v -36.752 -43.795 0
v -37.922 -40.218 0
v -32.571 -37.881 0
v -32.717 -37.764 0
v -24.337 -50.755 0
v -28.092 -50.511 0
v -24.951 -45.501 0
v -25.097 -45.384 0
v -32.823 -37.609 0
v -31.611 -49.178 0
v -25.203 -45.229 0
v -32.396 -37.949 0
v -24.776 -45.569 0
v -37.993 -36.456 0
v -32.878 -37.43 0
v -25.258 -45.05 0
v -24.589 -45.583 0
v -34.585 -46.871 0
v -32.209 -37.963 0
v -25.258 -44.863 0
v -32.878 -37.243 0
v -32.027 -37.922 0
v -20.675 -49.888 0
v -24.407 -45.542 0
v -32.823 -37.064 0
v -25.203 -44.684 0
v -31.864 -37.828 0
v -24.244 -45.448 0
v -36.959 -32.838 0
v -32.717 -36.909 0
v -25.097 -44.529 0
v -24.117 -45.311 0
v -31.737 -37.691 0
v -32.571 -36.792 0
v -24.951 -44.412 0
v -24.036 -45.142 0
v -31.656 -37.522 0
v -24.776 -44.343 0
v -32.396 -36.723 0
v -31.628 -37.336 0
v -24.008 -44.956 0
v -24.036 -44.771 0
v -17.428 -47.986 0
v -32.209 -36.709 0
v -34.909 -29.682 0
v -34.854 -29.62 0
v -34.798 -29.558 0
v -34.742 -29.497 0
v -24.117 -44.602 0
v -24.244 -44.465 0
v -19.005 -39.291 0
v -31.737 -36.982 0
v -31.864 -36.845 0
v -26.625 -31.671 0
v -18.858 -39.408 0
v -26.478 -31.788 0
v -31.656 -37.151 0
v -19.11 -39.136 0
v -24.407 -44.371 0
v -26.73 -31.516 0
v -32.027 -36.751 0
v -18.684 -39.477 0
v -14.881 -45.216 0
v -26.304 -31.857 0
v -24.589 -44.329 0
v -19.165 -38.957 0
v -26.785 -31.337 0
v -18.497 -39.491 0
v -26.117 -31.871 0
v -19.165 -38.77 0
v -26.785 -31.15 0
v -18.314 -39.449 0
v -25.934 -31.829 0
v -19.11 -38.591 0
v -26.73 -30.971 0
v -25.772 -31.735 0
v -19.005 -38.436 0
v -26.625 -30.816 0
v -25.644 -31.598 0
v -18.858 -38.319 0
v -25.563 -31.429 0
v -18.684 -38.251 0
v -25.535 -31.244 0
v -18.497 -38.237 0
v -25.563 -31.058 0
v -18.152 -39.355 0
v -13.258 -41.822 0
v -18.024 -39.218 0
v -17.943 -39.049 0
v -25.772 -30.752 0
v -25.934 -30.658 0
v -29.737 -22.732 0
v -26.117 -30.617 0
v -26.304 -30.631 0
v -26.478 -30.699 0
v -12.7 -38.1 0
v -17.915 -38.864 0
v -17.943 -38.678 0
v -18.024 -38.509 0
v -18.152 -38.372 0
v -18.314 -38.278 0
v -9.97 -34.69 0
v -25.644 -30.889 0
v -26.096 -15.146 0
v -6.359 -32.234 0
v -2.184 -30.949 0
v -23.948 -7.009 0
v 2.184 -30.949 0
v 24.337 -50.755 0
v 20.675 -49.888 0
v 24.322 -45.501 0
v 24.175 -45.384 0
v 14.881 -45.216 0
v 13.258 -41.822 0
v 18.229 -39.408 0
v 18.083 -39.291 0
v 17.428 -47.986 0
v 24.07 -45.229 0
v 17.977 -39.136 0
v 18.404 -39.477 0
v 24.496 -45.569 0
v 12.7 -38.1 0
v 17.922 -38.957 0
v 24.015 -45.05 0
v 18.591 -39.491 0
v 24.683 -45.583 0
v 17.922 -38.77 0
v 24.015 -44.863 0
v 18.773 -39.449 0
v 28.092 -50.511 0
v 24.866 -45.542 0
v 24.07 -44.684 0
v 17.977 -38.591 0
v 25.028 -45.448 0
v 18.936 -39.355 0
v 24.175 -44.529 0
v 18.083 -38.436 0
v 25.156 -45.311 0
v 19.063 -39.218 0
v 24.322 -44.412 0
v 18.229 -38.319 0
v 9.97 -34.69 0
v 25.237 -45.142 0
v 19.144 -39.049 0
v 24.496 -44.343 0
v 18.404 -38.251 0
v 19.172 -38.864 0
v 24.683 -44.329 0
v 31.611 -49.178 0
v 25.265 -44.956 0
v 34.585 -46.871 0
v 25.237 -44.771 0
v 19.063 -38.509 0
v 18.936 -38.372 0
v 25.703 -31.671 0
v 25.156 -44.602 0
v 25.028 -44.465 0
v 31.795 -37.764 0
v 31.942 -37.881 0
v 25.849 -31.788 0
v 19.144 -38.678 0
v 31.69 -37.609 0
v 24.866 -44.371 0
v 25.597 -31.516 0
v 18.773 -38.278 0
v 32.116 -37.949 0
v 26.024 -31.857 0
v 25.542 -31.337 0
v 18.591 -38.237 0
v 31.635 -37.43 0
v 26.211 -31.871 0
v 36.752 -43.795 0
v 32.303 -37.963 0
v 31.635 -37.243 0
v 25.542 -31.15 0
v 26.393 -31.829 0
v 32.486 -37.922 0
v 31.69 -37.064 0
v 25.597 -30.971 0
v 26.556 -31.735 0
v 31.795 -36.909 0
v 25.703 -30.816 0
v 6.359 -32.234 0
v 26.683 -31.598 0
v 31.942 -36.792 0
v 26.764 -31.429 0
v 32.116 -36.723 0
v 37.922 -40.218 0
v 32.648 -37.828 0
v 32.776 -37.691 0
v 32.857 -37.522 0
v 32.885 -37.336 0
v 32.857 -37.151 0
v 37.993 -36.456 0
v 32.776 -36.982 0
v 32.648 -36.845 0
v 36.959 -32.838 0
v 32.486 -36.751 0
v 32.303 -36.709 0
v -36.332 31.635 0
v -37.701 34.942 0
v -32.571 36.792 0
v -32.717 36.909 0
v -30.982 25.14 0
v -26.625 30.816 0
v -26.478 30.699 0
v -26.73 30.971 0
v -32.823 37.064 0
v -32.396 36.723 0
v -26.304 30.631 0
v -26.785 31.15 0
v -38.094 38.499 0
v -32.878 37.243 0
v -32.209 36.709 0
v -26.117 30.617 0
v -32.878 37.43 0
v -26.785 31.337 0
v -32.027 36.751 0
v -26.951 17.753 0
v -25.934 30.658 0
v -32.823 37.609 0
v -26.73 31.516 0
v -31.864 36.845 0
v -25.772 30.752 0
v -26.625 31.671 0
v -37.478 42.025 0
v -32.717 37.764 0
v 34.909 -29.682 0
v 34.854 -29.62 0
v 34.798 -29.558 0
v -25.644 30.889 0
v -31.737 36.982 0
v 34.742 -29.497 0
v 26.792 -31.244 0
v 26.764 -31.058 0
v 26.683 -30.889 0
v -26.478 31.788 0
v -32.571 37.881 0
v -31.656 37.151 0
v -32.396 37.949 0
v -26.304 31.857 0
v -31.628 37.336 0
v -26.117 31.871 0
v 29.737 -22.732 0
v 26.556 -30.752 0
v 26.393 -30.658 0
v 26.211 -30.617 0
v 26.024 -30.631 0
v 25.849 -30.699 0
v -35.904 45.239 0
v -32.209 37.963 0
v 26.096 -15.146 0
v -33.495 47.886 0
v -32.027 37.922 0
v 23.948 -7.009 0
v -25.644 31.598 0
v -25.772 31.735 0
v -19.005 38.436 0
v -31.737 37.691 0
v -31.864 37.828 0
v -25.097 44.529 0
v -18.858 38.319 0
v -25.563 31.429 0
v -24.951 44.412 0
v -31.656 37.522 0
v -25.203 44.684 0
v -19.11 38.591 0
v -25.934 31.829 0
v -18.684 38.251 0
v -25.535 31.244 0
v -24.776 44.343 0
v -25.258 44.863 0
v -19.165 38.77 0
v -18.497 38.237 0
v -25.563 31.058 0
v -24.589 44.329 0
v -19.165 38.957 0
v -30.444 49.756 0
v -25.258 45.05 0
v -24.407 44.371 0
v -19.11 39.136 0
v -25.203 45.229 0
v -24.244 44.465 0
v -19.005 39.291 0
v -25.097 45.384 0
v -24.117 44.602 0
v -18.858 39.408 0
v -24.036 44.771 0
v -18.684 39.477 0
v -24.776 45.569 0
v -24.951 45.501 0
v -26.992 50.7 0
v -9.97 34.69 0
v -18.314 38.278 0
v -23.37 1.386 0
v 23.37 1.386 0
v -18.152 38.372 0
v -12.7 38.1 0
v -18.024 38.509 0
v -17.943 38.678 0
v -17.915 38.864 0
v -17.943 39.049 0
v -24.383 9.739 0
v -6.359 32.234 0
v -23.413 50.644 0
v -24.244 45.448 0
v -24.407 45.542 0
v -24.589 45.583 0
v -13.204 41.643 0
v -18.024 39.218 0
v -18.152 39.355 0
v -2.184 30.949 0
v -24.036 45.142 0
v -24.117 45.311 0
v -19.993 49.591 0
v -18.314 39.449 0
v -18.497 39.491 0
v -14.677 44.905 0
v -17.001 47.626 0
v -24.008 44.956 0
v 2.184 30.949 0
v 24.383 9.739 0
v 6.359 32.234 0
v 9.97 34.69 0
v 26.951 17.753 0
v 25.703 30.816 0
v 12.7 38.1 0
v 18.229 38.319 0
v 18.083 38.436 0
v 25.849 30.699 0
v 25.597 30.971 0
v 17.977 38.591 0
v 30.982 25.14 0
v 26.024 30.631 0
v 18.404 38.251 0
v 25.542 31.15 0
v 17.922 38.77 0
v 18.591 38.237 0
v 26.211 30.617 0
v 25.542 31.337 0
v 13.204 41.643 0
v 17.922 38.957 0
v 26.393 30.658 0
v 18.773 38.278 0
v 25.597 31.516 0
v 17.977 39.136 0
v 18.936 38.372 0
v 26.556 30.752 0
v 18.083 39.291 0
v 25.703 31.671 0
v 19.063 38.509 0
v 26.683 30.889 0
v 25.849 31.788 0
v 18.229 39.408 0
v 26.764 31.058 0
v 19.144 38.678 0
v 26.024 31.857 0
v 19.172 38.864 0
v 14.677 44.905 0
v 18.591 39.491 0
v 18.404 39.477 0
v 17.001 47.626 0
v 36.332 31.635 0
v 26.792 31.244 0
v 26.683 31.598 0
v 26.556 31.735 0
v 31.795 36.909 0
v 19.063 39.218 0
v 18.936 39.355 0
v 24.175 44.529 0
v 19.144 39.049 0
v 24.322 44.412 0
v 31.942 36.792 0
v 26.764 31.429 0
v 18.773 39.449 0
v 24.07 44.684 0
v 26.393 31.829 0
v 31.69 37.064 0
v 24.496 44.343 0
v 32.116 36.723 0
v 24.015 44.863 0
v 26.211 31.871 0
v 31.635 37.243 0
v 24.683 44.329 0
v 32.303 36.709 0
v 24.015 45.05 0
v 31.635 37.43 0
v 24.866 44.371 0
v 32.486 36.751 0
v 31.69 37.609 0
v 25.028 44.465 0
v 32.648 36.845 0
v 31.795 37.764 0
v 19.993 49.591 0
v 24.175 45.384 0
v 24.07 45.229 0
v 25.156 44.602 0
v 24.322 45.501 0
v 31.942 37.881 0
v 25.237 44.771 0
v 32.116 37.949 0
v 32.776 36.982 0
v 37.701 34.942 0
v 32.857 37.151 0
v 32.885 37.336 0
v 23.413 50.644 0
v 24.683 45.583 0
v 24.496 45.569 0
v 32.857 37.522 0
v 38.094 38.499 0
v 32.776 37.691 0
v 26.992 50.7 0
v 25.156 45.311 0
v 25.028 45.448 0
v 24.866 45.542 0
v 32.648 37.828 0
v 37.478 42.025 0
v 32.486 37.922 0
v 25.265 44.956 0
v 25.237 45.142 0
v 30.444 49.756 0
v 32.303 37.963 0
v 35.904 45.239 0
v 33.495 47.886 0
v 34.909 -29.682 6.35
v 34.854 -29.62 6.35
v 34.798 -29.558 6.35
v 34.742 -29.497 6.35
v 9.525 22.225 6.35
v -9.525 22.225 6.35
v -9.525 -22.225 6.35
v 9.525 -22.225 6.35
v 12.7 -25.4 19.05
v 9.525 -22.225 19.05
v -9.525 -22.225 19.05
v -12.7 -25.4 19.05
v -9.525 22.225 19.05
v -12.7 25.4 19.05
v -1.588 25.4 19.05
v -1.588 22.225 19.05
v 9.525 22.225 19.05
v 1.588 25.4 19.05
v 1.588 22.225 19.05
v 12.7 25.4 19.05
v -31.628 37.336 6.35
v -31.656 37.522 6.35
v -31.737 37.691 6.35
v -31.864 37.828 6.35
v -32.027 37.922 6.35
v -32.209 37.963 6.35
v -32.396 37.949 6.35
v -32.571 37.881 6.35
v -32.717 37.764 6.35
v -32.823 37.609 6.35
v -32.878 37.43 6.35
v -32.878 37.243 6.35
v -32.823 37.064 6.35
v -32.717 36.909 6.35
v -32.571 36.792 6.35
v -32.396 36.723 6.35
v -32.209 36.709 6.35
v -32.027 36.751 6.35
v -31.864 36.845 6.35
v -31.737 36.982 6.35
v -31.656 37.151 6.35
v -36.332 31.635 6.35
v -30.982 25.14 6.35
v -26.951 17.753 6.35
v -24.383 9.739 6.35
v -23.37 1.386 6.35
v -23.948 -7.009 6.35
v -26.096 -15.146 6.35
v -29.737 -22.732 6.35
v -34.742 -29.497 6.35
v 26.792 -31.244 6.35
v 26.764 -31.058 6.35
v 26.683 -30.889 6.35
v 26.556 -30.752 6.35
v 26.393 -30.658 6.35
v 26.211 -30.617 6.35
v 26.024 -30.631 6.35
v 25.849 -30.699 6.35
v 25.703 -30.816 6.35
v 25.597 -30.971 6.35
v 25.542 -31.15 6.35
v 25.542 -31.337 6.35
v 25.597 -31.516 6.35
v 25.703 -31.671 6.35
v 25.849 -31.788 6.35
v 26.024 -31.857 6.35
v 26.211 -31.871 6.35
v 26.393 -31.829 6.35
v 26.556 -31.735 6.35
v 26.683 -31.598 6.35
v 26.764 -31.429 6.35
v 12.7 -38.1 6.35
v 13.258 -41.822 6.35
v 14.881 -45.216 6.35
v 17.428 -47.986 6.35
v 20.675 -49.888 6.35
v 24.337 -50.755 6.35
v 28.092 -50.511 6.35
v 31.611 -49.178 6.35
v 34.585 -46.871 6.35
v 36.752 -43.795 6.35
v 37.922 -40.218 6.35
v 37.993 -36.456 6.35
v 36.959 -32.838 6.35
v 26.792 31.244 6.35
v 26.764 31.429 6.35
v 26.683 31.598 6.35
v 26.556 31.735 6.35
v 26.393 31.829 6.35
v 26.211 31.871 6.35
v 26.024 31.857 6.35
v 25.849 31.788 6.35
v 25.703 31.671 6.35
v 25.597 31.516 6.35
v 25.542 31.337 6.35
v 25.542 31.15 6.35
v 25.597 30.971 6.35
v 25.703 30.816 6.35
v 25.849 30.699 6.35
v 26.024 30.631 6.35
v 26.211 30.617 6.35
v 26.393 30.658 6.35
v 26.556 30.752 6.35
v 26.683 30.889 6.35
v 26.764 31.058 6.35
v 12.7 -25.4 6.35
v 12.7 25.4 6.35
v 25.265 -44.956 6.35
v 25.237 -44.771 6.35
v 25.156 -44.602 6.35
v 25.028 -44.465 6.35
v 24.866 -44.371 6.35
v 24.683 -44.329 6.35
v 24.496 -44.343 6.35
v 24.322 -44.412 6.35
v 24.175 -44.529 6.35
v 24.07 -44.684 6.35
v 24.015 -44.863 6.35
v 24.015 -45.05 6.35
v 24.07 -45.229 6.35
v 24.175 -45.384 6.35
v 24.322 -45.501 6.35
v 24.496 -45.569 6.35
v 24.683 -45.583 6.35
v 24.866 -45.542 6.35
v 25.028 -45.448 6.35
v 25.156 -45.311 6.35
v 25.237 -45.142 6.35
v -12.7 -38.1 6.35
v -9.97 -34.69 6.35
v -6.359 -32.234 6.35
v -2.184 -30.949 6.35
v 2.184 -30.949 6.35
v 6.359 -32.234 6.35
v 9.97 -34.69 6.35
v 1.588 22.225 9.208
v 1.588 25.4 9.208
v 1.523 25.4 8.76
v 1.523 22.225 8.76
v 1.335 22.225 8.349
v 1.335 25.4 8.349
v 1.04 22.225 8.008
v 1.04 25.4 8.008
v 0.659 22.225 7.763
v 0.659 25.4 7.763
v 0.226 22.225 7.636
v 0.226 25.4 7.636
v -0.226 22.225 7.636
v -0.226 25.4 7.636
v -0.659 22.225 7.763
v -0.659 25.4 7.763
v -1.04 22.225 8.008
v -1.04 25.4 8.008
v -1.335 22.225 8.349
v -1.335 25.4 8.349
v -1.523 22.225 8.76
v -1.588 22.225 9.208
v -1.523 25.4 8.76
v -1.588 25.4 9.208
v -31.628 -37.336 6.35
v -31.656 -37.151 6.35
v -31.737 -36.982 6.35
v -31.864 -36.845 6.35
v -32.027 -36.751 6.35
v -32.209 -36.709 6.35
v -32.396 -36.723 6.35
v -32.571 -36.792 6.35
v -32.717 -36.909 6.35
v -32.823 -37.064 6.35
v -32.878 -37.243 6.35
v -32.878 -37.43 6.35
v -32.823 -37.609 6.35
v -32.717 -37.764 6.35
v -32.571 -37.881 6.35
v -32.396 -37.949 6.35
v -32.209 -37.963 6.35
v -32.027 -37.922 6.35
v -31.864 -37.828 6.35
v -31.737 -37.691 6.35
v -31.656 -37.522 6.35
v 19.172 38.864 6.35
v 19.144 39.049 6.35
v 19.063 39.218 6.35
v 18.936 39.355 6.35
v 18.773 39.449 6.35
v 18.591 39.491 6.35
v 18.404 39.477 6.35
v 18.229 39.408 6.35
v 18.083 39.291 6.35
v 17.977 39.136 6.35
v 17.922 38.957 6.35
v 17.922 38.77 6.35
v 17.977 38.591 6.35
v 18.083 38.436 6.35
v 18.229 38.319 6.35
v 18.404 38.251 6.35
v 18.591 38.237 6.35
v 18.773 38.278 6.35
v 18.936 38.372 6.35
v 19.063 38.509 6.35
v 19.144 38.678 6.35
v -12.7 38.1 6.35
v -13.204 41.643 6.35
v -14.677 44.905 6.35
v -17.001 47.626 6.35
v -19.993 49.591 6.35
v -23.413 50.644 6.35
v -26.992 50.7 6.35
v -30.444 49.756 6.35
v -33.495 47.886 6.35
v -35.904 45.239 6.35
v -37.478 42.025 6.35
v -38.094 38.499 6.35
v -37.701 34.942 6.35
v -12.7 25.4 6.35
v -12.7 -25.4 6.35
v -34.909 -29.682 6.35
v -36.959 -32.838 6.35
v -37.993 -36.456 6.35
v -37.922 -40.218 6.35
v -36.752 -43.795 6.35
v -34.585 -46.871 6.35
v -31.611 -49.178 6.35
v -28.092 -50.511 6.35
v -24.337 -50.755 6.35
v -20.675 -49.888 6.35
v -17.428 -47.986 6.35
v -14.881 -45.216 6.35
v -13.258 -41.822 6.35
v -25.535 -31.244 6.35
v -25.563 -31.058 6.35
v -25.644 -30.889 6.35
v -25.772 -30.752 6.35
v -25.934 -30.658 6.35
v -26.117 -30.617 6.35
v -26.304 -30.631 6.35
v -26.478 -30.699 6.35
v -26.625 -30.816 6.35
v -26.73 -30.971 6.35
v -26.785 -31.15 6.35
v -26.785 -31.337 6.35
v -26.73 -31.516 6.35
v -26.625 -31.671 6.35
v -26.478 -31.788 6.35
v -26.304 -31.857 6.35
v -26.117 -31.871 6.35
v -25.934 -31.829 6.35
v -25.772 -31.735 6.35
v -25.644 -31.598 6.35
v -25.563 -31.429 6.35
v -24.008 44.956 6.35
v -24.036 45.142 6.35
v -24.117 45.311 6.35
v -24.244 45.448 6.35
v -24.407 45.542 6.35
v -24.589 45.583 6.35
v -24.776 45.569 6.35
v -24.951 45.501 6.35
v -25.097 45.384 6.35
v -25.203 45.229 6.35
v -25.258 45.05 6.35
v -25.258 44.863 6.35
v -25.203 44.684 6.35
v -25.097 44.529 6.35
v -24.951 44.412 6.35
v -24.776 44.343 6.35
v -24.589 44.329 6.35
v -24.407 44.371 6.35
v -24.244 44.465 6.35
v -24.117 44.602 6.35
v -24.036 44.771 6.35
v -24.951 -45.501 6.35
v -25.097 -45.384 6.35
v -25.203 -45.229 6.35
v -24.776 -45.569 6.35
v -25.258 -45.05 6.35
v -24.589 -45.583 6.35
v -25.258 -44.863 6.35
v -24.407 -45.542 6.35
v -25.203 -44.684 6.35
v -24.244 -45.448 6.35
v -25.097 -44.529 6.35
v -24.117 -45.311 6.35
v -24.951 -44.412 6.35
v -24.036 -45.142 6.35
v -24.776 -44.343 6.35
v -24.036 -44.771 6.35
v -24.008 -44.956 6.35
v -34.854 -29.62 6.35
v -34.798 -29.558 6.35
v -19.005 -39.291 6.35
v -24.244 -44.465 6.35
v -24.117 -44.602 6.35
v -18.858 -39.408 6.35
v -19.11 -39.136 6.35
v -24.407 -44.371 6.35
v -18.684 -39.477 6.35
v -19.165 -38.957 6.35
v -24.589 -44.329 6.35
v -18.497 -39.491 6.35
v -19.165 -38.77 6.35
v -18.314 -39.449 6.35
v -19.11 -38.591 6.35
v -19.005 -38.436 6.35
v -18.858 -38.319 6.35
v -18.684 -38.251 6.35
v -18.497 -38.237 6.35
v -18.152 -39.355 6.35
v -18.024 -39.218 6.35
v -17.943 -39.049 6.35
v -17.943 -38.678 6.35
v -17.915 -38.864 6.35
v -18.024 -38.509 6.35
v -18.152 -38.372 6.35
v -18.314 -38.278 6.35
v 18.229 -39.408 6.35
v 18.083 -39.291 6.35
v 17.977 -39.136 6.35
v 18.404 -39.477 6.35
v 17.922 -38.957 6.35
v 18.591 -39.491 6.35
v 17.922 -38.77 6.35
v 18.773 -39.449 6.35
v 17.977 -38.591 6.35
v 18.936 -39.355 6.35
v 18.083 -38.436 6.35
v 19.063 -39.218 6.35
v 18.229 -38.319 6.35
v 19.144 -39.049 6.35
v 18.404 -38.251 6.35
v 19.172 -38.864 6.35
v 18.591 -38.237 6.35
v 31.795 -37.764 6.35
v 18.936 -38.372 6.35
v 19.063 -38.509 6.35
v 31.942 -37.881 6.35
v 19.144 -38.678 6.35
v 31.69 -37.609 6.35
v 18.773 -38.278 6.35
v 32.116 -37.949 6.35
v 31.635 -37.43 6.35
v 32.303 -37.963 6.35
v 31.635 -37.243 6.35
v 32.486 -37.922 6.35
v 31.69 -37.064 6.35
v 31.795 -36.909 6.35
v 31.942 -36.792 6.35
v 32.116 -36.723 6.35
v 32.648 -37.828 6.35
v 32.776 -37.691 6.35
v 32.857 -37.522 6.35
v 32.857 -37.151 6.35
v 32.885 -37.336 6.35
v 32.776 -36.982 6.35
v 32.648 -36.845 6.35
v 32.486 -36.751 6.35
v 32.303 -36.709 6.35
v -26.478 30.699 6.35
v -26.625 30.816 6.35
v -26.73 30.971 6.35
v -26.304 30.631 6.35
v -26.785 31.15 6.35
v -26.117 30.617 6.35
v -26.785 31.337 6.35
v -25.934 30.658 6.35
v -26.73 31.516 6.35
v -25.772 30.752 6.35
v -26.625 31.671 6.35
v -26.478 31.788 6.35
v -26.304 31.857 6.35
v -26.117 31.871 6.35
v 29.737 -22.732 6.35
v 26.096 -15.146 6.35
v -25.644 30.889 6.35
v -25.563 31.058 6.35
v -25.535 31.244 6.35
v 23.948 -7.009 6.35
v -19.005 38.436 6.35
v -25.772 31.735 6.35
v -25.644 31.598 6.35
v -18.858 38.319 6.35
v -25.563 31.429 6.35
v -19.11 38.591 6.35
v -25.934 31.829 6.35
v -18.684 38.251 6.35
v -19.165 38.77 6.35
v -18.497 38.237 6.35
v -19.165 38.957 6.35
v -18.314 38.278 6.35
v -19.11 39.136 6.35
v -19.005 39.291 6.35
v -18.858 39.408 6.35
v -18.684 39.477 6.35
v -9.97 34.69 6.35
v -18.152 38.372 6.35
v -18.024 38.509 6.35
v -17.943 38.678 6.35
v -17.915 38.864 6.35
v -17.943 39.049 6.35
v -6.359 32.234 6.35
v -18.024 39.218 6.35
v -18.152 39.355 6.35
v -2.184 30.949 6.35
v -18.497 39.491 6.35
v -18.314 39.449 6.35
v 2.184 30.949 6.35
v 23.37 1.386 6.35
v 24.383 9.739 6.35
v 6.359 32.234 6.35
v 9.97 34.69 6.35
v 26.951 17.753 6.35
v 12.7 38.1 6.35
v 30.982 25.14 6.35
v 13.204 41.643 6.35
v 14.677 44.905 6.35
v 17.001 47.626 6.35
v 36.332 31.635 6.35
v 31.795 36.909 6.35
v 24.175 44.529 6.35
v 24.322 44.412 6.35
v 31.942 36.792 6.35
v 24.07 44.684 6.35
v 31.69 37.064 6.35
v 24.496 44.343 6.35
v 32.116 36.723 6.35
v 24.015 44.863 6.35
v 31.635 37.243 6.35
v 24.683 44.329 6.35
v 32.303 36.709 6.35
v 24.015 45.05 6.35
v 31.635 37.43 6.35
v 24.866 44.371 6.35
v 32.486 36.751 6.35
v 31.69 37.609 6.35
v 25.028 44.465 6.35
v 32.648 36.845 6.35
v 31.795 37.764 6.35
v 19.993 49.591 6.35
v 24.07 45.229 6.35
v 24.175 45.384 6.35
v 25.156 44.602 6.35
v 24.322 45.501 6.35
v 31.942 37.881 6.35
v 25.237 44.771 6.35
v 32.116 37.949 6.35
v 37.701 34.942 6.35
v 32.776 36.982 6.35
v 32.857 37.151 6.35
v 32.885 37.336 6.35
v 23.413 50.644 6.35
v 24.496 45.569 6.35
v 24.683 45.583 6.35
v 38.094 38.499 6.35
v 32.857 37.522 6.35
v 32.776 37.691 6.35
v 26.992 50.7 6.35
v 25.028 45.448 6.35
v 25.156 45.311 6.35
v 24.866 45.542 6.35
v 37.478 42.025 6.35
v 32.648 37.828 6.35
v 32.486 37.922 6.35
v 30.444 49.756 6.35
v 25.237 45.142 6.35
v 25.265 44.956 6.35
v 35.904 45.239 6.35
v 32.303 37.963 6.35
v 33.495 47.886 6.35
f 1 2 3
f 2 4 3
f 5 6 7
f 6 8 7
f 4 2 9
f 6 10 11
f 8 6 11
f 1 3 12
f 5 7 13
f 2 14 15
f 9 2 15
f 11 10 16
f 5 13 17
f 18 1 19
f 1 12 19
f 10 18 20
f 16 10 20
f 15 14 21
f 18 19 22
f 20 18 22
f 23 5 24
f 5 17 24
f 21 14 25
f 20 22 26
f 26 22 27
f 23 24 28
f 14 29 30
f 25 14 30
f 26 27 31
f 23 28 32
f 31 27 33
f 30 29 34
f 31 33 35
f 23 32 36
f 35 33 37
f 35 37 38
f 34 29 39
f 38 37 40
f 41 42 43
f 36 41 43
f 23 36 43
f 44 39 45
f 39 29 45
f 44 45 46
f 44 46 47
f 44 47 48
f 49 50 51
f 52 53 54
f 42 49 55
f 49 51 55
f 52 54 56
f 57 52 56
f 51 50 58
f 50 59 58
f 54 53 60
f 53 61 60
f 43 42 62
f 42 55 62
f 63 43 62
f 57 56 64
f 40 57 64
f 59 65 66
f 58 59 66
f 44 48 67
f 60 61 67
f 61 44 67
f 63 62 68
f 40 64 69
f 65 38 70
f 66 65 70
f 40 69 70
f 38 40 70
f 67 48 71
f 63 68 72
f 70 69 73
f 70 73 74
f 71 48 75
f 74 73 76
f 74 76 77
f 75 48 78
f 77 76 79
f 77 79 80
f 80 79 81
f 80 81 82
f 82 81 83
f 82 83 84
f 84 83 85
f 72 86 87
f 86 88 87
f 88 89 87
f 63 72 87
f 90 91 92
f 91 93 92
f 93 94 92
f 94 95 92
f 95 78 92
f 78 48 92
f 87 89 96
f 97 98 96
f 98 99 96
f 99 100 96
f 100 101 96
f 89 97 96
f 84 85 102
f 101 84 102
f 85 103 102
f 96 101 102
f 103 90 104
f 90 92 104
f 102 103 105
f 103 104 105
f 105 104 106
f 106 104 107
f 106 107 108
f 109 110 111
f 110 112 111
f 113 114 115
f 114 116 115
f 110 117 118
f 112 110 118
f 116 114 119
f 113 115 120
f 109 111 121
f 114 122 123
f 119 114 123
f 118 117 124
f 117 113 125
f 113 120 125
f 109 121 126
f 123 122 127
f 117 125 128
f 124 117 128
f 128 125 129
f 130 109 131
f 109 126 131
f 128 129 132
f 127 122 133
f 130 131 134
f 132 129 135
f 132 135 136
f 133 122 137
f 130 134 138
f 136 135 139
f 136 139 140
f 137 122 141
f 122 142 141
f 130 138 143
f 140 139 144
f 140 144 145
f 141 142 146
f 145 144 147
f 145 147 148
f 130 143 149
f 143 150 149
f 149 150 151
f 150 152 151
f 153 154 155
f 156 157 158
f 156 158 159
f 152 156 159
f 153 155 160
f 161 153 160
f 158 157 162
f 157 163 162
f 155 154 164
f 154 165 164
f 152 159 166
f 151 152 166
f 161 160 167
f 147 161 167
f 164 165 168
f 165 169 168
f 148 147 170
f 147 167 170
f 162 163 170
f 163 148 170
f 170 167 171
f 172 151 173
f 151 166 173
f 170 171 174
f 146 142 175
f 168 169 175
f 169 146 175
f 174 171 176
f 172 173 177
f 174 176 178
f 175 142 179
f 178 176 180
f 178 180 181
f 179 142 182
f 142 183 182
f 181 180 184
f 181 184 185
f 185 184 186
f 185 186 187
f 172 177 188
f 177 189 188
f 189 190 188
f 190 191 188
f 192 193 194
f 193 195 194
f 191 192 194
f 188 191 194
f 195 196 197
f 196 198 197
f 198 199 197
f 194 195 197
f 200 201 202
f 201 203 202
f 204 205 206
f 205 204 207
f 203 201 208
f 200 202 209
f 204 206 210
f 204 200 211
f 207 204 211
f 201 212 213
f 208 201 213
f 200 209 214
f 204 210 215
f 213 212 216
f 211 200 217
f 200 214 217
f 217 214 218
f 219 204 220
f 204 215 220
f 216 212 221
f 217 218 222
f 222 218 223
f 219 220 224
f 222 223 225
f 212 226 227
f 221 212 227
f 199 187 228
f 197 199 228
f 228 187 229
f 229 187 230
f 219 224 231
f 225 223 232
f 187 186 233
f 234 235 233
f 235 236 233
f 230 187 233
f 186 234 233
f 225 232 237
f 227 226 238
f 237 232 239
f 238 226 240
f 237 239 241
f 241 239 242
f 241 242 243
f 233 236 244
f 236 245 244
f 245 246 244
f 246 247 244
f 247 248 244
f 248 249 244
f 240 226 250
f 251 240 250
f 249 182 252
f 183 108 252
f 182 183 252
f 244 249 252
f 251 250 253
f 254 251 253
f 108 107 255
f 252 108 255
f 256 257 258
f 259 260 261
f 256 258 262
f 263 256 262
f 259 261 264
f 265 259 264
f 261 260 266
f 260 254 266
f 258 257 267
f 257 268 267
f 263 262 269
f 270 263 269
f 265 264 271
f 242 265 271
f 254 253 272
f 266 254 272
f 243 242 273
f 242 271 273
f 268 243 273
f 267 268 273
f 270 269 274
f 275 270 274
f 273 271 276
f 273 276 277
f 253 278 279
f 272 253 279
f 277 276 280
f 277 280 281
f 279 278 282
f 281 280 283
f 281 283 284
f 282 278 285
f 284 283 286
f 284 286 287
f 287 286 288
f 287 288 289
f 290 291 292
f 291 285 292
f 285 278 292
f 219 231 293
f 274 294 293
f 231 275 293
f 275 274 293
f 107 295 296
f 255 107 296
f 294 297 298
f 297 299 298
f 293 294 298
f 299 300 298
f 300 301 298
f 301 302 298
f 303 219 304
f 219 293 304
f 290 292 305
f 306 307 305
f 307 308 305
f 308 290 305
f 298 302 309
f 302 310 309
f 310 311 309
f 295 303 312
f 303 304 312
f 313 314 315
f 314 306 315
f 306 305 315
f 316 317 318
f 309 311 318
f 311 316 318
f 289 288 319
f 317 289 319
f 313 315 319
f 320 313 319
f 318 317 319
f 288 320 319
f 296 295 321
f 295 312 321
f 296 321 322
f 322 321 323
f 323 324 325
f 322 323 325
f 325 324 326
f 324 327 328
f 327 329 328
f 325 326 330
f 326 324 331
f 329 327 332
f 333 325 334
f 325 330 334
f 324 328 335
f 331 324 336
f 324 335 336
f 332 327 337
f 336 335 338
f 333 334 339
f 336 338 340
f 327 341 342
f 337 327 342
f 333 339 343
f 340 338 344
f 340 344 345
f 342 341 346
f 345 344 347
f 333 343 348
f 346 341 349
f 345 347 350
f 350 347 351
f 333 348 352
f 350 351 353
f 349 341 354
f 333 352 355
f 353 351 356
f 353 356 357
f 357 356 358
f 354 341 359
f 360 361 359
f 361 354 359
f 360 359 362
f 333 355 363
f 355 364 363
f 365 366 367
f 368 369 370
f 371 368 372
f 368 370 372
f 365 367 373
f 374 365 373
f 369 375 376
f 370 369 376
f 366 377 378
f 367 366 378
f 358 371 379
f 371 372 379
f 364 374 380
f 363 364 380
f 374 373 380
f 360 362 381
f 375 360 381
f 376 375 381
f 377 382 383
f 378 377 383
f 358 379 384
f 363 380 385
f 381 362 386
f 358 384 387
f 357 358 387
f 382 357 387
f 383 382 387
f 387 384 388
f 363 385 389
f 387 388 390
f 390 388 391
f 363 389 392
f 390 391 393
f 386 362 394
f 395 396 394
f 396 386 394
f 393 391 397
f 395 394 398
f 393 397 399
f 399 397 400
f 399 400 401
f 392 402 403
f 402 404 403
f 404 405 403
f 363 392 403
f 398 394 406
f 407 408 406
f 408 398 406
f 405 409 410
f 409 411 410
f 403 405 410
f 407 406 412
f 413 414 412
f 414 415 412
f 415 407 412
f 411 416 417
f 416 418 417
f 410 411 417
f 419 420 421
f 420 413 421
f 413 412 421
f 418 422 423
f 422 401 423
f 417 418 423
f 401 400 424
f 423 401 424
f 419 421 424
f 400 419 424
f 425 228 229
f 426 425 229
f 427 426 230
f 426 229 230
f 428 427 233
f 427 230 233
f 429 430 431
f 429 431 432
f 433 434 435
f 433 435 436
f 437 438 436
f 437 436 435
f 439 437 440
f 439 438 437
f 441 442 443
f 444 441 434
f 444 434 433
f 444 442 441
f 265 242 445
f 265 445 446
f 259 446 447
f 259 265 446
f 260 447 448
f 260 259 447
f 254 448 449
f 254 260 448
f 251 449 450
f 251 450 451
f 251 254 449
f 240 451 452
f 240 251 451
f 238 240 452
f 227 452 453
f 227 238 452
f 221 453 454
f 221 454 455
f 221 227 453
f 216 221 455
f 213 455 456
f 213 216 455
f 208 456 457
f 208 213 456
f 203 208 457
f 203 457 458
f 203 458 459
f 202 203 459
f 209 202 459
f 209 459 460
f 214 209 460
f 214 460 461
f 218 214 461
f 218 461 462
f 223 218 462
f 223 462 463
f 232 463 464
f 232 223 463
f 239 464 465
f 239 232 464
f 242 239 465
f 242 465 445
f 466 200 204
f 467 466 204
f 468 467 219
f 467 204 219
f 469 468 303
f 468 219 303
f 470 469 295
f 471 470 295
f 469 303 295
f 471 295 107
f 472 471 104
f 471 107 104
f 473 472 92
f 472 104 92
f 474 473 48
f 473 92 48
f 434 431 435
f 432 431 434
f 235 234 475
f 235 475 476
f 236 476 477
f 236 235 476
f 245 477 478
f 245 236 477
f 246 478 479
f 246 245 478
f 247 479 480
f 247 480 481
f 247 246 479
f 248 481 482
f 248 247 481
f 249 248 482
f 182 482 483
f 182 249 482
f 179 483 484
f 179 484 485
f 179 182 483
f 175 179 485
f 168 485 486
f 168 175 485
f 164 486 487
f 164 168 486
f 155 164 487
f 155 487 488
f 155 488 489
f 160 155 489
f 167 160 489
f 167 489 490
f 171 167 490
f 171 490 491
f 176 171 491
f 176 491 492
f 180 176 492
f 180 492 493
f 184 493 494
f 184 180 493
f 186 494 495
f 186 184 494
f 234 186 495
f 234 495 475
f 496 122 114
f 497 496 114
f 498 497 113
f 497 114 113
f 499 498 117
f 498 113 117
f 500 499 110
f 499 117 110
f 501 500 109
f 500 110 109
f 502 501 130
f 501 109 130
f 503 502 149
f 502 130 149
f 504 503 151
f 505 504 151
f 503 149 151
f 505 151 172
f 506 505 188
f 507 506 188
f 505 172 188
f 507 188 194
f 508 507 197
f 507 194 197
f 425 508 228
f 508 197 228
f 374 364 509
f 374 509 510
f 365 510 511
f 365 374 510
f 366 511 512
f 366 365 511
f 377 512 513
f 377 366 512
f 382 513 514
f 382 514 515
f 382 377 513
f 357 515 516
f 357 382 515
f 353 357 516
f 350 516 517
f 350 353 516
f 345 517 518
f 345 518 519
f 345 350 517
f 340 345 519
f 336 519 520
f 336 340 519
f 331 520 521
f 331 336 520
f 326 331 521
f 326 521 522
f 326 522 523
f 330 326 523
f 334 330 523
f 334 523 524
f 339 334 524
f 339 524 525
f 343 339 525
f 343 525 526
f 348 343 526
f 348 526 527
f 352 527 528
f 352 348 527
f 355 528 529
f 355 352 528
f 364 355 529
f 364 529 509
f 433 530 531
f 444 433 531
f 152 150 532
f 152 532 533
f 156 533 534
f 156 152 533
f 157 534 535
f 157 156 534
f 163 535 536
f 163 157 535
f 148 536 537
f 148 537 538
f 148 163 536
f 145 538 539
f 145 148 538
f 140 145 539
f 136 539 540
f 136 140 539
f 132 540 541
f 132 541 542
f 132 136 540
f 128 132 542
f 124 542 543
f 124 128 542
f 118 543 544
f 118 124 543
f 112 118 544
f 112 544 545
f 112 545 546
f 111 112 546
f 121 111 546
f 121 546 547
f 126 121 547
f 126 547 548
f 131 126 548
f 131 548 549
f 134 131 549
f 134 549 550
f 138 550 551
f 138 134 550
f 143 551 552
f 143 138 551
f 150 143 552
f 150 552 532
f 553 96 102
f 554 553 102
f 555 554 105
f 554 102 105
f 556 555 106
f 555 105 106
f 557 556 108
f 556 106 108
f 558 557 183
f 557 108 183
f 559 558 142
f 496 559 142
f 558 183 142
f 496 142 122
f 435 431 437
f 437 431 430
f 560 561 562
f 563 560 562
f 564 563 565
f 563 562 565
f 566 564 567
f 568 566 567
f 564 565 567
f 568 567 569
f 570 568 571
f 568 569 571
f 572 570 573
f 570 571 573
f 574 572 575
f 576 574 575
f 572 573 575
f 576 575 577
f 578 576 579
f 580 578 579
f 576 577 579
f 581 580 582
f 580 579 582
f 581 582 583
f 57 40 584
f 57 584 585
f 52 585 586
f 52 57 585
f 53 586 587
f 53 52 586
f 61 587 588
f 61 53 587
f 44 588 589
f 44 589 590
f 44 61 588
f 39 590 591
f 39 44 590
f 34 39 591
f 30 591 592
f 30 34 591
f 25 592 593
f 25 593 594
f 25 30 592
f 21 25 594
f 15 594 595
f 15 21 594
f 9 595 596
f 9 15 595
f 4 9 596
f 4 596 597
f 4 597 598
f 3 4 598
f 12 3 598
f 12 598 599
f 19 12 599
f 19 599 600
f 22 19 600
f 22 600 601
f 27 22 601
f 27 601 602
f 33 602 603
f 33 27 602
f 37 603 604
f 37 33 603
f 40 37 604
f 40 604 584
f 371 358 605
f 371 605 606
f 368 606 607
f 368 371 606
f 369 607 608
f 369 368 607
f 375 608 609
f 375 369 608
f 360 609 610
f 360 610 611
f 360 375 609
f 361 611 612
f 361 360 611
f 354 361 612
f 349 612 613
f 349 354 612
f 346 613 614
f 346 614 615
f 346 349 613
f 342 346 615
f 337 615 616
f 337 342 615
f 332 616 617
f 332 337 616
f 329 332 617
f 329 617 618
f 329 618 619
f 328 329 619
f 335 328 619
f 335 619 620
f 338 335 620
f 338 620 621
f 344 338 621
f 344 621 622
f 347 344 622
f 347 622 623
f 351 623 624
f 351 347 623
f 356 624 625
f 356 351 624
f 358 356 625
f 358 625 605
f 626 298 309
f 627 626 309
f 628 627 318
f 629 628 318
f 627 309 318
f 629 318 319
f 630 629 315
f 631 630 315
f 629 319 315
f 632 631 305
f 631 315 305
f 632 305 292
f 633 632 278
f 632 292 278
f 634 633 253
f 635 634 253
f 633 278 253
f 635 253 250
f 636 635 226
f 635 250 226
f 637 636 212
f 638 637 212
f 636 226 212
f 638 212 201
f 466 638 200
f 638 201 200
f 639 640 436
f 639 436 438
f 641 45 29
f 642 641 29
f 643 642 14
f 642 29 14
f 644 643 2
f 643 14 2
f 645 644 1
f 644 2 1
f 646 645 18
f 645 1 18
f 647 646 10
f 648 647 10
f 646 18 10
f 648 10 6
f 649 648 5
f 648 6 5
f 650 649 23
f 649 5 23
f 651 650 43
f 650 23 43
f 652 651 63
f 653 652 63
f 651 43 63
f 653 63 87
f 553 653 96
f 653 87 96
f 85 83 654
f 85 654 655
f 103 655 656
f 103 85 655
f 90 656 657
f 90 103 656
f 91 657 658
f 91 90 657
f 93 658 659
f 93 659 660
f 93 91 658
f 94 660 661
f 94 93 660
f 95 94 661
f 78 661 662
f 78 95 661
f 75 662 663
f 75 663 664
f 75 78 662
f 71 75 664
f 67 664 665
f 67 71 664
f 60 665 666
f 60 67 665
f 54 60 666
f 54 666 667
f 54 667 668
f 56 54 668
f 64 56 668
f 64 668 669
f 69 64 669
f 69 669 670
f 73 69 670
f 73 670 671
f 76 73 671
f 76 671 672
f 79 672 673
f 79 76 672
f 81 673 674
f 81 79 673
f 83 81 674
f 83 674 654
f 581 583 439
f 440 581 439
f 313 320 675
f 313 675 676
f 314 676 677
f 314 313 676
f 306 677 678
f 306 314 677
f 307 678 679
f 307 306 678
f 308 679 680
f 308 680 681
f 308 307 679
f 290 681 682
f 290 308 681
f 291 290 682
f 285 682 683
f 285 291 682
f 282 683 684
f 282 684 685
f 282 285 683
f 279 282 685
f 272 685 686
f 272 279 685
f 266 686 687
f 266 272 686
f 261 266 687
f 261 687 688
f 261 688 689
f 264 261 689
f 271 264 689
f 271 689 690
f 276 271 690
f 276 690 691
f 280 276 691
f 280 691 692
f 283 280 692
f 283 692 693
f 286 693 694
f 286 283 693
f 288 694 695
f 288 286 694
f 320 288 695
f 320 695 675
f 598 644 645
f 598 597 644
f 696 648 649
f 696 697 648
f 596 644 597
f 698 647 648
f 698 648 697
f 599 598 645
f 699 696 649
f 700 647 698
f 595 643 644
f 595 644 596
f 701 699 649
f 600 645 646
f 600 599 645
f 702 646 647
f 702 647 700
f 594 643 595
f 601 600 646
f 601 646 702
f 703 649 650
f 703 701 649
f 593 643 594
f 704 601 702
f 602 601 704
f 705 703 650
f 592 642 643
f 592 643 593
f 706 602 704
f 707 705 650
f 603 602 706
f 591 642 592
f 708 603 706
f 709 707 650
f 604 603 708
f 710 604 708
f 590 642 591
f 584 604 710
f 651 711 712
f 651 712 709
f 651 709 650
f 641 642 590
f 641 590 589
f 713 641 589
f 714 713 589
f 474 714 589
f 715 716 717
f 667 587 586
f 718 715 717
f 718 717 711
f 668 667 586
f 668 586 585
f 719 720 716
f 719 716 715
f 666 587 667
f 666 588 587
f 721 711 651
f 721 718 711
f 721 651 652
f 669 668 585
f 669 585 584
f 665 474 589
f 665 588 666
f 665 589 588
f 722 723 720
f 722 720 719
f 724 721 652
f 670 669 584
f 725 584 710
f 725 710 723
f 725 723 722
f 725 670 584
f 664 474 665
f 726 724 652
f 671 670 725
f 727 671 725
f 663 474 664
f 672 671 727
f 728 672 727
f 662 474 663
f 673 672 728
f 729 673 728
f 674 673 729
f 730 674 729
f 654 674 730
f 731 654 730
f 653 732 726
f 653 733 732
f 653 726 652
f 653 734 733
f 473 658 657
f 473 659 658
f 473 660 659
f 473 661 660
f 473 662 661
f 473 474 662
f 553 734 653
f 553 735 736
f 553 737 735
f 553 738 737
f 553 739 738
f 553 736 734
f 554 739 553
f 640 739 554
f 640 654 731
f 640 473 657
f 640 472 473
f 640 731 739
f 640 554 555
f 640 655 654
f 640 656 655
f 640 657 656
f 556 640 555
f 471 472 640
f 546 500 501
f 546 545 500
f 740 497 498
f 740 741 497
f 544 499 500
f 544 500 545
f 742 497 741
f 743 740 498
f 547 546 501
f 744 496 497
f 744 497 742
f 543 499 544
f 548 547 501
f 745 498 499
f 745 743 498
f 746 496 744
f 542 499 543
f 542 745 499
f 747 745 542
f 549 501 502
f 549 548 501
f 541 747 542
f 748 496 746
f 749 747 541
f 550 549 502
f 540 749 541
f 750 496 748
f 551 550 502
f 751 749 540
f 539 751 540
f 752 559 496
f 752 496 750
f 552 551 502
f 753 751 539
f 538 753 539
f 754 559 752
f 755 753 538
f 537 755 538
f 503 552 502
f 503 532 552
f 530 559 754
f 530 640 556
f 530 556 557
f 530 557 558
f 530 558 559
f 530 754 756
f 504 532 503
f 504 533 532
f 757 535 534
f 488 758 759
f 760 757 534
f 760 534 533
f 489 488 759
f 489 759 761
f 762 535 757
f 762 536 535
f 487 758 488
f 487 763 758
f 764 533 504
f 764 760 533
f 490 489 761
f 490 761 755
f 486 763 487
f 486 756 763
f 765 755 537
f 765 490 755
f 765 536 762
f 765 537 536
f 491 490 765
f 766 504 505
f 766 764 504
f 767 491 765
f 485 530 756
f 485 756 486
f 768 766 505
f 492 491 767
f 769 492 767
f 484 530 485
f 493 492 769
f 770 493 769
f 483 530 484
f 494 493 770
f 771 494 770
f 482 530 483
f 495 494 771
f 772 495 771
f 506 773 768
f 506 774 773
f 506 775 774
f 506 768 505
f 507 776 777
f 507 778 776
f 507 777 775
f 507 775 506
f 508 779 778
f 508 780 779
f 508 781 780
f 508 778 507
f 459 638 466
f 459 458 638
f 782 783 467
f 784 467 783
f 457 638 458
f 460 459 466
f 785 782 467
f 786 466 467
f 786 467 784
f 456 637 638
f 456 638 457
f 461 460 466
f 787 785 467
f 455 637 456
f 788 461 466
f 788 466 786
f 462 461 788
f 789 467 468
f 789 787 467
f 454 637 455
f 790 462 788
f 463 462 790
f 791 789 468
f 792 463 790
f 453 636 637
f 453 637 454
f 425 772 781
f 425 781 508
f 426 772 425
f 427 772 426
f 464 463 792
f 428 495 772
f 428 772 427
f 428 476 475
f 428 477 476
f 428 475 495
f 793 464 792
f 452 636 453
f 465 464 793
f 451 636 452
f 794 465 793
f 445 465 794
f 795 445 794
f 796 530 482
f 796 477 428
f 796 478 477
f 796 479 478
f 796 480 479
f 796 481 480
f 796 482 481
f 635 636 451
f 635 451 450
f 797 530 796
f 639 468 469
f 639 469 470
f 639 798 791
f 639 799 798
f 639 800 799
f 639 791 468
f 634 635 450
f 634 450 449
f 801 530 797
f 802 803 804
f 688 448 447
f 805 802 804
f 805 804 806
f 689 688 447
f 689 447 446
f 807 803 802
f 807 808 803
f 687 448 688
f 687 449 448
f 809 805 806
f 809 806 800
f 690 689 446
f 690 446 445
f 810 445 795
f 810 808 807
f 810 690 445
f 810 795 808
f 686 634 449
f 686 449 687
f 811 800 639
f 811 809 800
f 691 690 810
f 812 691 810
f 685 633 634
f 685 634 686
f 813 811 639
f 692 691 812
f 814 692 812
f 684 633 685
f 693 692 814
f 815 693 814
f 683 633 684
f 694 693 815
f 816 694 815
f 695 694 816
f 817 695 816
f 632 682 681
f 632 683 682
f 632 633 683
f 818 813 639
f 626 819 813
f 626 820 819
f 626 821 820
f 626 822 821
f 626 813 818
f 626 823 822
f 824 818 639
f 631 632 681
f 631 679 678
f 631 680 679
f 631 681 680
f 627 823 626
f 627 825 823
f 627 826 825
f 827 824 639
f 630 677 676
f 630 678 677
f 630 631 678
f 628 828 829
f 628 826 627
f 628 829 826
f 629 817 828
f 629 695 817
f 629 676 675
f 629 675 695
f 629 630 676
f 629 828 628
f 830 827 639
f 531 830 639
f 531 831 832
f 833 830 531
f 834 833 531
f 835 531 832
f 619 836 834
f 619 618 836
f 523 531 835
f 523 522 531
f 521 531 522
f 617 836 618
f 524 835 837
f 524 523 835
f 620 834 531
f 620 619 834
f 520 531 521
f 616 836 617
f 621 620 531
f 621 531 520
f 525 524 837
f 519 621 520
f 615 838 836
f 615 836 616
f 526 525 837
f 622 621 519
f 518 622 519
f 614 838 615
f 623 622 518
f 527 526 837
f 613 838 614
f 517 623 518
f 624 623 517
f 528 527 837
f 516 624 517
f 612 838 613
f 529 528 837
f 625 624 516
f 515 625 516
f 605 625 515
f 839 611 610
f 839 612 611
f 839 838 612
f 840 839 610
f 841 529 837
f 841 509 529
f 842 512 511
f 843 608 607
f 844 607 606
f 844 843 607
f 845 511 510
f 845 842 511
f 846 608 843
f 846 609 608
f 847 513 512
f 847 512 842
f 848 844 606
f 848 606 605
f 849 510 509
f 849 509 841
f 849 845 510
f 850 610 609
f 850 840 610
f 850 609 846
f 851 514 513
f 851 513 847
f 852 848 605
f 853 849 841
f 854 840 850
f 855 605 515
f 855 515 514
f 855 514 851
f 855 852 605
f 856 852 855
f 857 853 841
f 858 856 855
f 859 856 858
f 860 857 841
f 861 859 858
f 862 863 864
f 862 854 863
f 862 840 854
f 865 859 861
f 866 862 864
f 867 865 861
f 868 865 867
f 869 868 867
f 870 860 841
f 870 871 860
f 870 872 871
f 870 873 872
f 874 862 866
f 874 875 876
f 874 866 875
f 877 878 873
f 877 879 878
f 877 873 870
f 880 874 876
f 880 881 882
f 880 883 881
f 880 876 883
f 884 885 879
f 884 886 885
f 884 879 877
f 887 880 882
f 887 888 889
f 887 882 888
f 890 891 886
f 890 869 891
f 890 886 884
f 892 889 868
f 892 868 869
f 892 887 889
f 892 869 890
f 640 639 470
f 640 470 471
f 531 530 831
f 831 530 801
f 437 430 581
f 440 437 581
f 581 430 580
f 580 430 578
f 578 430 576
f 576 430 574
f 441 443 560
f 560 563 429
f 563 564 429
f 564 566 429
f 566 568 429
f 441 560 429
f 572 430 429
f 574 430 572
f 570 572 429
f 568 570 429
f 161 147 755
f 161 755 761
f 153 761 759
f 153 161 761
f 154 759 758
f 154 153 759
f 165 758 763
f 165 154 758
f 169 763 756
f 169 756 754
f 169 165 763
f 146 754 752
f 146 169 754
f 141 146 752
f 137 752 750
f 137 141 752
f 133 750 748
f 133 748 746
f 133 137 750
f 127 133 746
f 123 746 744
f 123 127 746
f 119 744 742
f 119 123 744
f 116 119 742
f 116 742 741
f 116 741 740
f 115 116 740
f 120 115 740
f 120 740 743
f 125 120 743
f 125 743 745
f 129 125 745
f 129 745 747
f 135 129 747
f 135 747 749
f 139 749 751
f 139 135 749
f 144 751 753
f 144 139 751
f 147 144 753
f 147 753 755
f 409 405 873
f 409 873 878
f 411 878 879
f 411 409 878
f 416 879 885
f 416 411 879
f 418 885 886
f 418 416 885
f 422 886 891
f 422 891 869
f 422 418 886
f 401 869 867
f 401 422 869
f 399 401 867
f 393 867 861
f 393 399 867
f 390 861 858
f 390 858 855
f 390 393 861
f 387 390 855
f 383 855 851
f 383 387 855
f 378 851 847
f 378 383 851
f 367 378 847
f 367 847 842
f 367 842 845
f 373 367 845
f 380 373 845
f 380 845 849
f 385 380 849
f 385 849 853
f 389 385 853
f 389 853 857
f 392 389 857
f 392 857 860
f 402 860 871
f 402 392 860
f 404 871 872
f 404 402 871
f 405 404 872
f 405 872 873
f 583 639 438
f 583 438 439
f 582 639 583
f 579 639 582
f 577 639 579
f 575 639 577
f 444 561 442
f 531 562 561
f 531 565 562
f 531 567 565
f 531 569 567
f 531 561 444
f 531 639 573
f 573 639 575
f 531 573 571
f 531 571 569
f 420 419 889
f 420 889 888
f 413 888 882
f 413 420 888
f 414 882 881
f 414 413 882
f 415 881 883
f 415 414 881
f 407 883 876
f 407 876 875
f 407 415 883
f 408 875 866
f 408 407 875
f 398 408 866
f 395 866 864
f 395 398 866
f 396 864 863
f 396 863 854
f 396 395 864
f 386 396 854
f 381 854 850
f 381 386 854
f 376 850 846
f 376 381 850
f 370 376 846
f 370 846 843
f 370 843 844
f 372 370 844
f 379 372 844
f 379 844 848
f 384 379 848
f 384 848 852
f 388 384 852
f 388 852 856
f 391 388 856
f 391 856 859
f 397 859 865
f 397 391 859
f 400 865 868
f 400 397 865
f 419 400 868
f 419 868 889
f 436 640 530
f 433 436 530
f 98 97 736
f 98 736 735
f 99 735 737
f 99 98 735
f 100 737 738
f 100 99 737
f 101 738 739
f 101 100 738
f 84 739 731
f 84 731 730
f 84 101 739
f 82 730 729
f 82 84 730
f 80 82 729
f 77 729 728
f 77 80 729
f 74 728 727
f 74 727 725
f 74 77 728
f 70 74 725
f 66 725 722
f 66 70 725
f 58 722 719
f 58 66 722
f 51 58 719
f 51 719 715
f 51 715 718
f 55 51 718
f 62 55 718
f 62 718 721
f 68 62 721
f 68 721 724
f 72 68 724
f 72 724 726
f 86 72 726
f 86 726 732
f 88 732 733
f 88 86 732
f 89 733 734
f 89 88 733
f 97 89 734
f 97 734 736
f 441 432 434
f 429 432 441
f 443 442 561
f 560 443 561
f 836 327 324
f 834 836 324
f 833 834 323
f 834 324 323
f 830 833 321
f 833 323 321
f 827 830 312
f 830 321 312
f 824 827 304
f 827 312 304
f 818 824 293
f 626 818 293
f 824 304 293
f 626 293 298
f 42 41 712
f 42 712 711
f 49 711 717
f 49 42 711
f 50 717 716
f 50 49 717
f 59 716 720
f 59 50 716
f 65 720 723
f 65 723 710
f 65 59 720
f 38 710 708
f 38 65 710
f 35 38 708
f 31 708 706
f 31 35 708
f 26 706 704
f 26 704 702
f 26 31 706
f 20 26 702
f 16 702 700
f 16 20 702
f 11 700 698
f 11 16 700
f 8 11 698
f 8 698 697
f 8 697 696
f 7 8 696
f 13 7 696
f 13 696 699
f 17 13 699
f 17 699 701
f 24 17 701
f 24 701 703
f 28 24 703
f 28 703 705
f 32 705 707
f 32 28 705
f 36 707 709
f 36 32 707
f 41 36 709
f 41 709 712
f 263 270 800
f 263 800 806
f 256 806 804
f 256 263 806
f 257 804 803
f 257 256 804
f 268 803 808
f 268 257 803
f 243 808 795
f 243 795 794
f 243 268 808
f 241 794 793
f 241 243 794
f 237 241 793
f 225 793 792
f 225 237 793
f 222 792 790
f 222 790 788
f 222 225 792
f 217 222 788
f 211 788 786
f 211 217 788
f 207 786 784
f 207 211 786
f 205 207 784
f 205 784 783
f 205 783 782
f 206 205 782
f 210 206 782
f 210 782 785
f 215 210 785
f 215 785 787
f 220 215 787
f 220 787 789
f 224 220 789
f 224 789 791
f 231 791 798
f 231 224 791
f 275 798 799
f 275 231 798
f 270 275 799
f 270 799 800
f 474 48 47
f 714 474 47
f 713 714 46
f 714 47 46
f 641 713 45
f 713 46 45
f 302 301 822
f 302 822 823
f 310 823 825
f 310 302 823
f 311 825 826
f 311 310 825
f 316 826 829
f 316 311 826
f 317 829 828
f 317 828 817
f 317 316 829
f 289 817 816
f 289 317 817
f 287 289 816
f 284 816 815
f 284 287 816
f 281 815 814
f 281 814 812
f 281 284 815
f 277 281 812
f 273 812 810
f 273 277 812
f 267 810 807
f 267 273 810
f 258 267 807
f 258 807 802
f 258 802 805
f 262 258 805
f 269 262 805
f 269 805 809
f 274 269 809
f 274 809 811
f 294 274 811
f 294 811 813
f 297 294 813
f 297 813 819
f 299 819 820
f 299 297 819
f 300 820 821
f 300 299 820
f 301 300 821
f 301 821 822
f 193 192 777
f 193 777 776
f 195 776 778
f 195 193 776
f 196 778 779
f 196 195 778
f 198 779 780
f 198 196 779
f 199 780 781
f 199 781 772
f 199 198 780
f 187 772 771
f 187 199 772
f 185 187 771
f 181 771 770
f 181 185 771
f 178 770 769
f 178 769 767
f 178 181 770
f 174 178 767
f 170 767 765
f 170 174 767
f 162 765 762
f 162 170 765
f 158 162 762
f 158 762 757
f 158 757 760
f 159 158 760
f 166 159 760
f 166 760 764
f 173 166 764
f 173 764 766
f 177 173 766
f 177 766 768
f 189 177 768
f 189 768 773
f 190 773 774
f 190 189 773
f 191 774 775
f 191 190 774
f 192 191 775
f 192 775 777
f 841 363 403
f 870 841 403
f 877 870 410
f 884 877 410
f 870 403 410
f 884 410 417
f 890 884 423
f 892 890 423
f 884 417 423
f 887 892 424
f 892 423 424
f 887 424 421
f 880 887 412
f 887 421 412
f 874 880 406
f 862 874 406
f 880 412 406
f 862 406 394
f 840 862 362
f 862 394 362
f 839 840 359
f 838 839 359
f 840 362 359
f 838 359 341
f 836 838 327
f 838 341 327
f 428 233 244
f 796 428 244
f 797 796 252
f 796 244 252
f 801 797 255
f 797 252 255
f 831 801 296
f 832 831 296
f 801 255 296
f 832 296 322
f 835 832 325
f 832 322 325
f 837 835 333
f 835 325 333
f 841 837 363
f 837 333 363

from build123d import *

# Parameters (mm, degrees)
F0_R     = 0.628762
F1_DEPTH = 6.35
F2_W     = 25.4
F2_H     = 50.8
F2_W_2   = 19.05
F2_H_2   = 44.45
F3_DEPTH = 12.7
F5_DEPTH = 25.4


with BuildPart() as f1:
    # F0 (on Top) → F1 (new body)
    with BuildSketch(Plane.XY):
        with BuildLine():
            ThreePointArc((12.7, 38.1), (0, 30.785806), (-12.7, 38.1))
            ThreePointArc((-12.7, 38.1), (-28.751062, 50.349914), (-36.331557, 31.635399))
            ThreePointArc((-36.331557, 31.635399), (-23.370243, 1.385669), (-34.742058, -29.496748))
            ThreePointArc((-34.742058, -29.496748), (-34.825441, -29.589354), (-34.909084, -29.681727))
            ThreePointArc((-34.909084, -29.681727), (-29.901368, -49.975508), (-12.7, -38.1))
            ThreePointArc((-12.7, -38.1), (0, -30.785806), (12.7, -38.1))
            ThreePointArc((12.7, -38.1), (29.901368, -49.975508), (34.909084, -29.681727))
            ThreePointArc((34.909084, -29.681727), (34.825441, -29.589354), (34.742058, -29.496748))
            ThreePointArc((34.742058, -29.496748), (23.370243, 1.385669), (36.331557, 31.635399))
            ThreePointArc((36.331557, 31.635399), (28.751062, 50.349914), (12.7, 38.1))
        make_face()
        with Locations((-24.636335, -44.956376)):
            Circle(F0_R, mode=Mode.SUBTRACT)
        with Locations((-32.256376, -37.336335)):
            Circle(F0_R, mode=Mode.SUBTRACT)
        with Locations((-26.163665, -31.243624)):
            Circle(F0_R, mode=Mode.SUBTRACT)
        with Locations((-18.543624, -38.863665)):
            Circle(F0_R, mode=Mode.SUBTRACT)
        with Locations((18.543624, -38.863665)):
            Circle(F0_R, mode=Mode.SUBTRACT)
        with Locations((24.636335, -44.956376)):
            Circle(F0_R, mode=Mode.SUBTRACT)
        with Locations((26.163665, -31.243624)):
            Circle(F0_R, mode=Mode.SUBTRACT)
        with Locations((32.256376, -37.336335)):
            Circle(F0_R, mode=Mode.SUBTRACT)
        with Locations((-32.256376, 37.336335)):
            Circle(F0_R, mode=Mode.SUBTRACT)
        with Locations((-26.163665, 31.243624)):
            Circle(F0_R, mode=Mode.SUBTRACT)
        with Locations((-24.636335, 44.956376)):
            Circle(F0_R, mode=Mode.SUBTRACT)
        with Locations((-18.543624, 38.863665)):
            Circle(F0_R, mode=Mode.SUBTRACT)
        with Locations((18.543624, 38.863665)):
            Circle(F0_R, mode=Mode.SUBTRACT)
        with Locations((26.163665, 31.243624)):
            Circle(F0_R, mode=Mode.SUBTRACT)
        with Locations((32.256376, 37.336335)):
            Circle(F0_R, mode=Mode.SUBTRACT)
        with Locations((24.636335, 44.956376)):
            Circle(F0_R, mode=Mode.SUBTRACT)
        with BuildLine():
            ThreePointArc((-34.909084, -29.681727), (-34.825441, -29.589354), (-34.742058, -29.496748))
            ThreePointArc((-34.742058, -29.496748), (-34.826025, -29.588828), (-34.909084, -29.681727))
        make_face()
        with BuildLine():
            ThreePointArc((34.909084, -29.681727), (34.826025, -29.588828), (34.742058, -29.496748))
            ThreePointArc((34.742058, -29.496748), (34.825441, -29.589354), (34.909084, -29.681727))
        make_face()
    extrude(amount=F1_DEPTH)

    # F2 (on face) → F3 (join)
    with BuildSketch(Plane.XY.offset(6.35)):
        Rectangle(F2_W, F2_H)
        Rectangle(F2_W_2, F2_H_2, mode=Mode.SUBTRACT)
    extrude(amount=F3_DEPTH)

    # F4 (on face) → F5 (cut)
    with BuildSketch(Plane(origin=(0, 25.4, 0), x_dir=(-1, 0, 0), z_dir=(0, 1, 0))):
        with BuildLine():
            Line((1.5875, 19.05), (-1.5875, 19.05))
            Line((-1.5875, 19.05), (-1.5875, 9.2075))
            ThreePointArc((-1.5875, 9.2075), (0, 7.62), (1.5875, 9.2075))
            Line((1.5875, 9.2075), (1.5875, 19.05))
        make_face()
    extrude(amount=-F5_DEPTH, mode=Mode.SUBTRACT)


solid = f1.part
